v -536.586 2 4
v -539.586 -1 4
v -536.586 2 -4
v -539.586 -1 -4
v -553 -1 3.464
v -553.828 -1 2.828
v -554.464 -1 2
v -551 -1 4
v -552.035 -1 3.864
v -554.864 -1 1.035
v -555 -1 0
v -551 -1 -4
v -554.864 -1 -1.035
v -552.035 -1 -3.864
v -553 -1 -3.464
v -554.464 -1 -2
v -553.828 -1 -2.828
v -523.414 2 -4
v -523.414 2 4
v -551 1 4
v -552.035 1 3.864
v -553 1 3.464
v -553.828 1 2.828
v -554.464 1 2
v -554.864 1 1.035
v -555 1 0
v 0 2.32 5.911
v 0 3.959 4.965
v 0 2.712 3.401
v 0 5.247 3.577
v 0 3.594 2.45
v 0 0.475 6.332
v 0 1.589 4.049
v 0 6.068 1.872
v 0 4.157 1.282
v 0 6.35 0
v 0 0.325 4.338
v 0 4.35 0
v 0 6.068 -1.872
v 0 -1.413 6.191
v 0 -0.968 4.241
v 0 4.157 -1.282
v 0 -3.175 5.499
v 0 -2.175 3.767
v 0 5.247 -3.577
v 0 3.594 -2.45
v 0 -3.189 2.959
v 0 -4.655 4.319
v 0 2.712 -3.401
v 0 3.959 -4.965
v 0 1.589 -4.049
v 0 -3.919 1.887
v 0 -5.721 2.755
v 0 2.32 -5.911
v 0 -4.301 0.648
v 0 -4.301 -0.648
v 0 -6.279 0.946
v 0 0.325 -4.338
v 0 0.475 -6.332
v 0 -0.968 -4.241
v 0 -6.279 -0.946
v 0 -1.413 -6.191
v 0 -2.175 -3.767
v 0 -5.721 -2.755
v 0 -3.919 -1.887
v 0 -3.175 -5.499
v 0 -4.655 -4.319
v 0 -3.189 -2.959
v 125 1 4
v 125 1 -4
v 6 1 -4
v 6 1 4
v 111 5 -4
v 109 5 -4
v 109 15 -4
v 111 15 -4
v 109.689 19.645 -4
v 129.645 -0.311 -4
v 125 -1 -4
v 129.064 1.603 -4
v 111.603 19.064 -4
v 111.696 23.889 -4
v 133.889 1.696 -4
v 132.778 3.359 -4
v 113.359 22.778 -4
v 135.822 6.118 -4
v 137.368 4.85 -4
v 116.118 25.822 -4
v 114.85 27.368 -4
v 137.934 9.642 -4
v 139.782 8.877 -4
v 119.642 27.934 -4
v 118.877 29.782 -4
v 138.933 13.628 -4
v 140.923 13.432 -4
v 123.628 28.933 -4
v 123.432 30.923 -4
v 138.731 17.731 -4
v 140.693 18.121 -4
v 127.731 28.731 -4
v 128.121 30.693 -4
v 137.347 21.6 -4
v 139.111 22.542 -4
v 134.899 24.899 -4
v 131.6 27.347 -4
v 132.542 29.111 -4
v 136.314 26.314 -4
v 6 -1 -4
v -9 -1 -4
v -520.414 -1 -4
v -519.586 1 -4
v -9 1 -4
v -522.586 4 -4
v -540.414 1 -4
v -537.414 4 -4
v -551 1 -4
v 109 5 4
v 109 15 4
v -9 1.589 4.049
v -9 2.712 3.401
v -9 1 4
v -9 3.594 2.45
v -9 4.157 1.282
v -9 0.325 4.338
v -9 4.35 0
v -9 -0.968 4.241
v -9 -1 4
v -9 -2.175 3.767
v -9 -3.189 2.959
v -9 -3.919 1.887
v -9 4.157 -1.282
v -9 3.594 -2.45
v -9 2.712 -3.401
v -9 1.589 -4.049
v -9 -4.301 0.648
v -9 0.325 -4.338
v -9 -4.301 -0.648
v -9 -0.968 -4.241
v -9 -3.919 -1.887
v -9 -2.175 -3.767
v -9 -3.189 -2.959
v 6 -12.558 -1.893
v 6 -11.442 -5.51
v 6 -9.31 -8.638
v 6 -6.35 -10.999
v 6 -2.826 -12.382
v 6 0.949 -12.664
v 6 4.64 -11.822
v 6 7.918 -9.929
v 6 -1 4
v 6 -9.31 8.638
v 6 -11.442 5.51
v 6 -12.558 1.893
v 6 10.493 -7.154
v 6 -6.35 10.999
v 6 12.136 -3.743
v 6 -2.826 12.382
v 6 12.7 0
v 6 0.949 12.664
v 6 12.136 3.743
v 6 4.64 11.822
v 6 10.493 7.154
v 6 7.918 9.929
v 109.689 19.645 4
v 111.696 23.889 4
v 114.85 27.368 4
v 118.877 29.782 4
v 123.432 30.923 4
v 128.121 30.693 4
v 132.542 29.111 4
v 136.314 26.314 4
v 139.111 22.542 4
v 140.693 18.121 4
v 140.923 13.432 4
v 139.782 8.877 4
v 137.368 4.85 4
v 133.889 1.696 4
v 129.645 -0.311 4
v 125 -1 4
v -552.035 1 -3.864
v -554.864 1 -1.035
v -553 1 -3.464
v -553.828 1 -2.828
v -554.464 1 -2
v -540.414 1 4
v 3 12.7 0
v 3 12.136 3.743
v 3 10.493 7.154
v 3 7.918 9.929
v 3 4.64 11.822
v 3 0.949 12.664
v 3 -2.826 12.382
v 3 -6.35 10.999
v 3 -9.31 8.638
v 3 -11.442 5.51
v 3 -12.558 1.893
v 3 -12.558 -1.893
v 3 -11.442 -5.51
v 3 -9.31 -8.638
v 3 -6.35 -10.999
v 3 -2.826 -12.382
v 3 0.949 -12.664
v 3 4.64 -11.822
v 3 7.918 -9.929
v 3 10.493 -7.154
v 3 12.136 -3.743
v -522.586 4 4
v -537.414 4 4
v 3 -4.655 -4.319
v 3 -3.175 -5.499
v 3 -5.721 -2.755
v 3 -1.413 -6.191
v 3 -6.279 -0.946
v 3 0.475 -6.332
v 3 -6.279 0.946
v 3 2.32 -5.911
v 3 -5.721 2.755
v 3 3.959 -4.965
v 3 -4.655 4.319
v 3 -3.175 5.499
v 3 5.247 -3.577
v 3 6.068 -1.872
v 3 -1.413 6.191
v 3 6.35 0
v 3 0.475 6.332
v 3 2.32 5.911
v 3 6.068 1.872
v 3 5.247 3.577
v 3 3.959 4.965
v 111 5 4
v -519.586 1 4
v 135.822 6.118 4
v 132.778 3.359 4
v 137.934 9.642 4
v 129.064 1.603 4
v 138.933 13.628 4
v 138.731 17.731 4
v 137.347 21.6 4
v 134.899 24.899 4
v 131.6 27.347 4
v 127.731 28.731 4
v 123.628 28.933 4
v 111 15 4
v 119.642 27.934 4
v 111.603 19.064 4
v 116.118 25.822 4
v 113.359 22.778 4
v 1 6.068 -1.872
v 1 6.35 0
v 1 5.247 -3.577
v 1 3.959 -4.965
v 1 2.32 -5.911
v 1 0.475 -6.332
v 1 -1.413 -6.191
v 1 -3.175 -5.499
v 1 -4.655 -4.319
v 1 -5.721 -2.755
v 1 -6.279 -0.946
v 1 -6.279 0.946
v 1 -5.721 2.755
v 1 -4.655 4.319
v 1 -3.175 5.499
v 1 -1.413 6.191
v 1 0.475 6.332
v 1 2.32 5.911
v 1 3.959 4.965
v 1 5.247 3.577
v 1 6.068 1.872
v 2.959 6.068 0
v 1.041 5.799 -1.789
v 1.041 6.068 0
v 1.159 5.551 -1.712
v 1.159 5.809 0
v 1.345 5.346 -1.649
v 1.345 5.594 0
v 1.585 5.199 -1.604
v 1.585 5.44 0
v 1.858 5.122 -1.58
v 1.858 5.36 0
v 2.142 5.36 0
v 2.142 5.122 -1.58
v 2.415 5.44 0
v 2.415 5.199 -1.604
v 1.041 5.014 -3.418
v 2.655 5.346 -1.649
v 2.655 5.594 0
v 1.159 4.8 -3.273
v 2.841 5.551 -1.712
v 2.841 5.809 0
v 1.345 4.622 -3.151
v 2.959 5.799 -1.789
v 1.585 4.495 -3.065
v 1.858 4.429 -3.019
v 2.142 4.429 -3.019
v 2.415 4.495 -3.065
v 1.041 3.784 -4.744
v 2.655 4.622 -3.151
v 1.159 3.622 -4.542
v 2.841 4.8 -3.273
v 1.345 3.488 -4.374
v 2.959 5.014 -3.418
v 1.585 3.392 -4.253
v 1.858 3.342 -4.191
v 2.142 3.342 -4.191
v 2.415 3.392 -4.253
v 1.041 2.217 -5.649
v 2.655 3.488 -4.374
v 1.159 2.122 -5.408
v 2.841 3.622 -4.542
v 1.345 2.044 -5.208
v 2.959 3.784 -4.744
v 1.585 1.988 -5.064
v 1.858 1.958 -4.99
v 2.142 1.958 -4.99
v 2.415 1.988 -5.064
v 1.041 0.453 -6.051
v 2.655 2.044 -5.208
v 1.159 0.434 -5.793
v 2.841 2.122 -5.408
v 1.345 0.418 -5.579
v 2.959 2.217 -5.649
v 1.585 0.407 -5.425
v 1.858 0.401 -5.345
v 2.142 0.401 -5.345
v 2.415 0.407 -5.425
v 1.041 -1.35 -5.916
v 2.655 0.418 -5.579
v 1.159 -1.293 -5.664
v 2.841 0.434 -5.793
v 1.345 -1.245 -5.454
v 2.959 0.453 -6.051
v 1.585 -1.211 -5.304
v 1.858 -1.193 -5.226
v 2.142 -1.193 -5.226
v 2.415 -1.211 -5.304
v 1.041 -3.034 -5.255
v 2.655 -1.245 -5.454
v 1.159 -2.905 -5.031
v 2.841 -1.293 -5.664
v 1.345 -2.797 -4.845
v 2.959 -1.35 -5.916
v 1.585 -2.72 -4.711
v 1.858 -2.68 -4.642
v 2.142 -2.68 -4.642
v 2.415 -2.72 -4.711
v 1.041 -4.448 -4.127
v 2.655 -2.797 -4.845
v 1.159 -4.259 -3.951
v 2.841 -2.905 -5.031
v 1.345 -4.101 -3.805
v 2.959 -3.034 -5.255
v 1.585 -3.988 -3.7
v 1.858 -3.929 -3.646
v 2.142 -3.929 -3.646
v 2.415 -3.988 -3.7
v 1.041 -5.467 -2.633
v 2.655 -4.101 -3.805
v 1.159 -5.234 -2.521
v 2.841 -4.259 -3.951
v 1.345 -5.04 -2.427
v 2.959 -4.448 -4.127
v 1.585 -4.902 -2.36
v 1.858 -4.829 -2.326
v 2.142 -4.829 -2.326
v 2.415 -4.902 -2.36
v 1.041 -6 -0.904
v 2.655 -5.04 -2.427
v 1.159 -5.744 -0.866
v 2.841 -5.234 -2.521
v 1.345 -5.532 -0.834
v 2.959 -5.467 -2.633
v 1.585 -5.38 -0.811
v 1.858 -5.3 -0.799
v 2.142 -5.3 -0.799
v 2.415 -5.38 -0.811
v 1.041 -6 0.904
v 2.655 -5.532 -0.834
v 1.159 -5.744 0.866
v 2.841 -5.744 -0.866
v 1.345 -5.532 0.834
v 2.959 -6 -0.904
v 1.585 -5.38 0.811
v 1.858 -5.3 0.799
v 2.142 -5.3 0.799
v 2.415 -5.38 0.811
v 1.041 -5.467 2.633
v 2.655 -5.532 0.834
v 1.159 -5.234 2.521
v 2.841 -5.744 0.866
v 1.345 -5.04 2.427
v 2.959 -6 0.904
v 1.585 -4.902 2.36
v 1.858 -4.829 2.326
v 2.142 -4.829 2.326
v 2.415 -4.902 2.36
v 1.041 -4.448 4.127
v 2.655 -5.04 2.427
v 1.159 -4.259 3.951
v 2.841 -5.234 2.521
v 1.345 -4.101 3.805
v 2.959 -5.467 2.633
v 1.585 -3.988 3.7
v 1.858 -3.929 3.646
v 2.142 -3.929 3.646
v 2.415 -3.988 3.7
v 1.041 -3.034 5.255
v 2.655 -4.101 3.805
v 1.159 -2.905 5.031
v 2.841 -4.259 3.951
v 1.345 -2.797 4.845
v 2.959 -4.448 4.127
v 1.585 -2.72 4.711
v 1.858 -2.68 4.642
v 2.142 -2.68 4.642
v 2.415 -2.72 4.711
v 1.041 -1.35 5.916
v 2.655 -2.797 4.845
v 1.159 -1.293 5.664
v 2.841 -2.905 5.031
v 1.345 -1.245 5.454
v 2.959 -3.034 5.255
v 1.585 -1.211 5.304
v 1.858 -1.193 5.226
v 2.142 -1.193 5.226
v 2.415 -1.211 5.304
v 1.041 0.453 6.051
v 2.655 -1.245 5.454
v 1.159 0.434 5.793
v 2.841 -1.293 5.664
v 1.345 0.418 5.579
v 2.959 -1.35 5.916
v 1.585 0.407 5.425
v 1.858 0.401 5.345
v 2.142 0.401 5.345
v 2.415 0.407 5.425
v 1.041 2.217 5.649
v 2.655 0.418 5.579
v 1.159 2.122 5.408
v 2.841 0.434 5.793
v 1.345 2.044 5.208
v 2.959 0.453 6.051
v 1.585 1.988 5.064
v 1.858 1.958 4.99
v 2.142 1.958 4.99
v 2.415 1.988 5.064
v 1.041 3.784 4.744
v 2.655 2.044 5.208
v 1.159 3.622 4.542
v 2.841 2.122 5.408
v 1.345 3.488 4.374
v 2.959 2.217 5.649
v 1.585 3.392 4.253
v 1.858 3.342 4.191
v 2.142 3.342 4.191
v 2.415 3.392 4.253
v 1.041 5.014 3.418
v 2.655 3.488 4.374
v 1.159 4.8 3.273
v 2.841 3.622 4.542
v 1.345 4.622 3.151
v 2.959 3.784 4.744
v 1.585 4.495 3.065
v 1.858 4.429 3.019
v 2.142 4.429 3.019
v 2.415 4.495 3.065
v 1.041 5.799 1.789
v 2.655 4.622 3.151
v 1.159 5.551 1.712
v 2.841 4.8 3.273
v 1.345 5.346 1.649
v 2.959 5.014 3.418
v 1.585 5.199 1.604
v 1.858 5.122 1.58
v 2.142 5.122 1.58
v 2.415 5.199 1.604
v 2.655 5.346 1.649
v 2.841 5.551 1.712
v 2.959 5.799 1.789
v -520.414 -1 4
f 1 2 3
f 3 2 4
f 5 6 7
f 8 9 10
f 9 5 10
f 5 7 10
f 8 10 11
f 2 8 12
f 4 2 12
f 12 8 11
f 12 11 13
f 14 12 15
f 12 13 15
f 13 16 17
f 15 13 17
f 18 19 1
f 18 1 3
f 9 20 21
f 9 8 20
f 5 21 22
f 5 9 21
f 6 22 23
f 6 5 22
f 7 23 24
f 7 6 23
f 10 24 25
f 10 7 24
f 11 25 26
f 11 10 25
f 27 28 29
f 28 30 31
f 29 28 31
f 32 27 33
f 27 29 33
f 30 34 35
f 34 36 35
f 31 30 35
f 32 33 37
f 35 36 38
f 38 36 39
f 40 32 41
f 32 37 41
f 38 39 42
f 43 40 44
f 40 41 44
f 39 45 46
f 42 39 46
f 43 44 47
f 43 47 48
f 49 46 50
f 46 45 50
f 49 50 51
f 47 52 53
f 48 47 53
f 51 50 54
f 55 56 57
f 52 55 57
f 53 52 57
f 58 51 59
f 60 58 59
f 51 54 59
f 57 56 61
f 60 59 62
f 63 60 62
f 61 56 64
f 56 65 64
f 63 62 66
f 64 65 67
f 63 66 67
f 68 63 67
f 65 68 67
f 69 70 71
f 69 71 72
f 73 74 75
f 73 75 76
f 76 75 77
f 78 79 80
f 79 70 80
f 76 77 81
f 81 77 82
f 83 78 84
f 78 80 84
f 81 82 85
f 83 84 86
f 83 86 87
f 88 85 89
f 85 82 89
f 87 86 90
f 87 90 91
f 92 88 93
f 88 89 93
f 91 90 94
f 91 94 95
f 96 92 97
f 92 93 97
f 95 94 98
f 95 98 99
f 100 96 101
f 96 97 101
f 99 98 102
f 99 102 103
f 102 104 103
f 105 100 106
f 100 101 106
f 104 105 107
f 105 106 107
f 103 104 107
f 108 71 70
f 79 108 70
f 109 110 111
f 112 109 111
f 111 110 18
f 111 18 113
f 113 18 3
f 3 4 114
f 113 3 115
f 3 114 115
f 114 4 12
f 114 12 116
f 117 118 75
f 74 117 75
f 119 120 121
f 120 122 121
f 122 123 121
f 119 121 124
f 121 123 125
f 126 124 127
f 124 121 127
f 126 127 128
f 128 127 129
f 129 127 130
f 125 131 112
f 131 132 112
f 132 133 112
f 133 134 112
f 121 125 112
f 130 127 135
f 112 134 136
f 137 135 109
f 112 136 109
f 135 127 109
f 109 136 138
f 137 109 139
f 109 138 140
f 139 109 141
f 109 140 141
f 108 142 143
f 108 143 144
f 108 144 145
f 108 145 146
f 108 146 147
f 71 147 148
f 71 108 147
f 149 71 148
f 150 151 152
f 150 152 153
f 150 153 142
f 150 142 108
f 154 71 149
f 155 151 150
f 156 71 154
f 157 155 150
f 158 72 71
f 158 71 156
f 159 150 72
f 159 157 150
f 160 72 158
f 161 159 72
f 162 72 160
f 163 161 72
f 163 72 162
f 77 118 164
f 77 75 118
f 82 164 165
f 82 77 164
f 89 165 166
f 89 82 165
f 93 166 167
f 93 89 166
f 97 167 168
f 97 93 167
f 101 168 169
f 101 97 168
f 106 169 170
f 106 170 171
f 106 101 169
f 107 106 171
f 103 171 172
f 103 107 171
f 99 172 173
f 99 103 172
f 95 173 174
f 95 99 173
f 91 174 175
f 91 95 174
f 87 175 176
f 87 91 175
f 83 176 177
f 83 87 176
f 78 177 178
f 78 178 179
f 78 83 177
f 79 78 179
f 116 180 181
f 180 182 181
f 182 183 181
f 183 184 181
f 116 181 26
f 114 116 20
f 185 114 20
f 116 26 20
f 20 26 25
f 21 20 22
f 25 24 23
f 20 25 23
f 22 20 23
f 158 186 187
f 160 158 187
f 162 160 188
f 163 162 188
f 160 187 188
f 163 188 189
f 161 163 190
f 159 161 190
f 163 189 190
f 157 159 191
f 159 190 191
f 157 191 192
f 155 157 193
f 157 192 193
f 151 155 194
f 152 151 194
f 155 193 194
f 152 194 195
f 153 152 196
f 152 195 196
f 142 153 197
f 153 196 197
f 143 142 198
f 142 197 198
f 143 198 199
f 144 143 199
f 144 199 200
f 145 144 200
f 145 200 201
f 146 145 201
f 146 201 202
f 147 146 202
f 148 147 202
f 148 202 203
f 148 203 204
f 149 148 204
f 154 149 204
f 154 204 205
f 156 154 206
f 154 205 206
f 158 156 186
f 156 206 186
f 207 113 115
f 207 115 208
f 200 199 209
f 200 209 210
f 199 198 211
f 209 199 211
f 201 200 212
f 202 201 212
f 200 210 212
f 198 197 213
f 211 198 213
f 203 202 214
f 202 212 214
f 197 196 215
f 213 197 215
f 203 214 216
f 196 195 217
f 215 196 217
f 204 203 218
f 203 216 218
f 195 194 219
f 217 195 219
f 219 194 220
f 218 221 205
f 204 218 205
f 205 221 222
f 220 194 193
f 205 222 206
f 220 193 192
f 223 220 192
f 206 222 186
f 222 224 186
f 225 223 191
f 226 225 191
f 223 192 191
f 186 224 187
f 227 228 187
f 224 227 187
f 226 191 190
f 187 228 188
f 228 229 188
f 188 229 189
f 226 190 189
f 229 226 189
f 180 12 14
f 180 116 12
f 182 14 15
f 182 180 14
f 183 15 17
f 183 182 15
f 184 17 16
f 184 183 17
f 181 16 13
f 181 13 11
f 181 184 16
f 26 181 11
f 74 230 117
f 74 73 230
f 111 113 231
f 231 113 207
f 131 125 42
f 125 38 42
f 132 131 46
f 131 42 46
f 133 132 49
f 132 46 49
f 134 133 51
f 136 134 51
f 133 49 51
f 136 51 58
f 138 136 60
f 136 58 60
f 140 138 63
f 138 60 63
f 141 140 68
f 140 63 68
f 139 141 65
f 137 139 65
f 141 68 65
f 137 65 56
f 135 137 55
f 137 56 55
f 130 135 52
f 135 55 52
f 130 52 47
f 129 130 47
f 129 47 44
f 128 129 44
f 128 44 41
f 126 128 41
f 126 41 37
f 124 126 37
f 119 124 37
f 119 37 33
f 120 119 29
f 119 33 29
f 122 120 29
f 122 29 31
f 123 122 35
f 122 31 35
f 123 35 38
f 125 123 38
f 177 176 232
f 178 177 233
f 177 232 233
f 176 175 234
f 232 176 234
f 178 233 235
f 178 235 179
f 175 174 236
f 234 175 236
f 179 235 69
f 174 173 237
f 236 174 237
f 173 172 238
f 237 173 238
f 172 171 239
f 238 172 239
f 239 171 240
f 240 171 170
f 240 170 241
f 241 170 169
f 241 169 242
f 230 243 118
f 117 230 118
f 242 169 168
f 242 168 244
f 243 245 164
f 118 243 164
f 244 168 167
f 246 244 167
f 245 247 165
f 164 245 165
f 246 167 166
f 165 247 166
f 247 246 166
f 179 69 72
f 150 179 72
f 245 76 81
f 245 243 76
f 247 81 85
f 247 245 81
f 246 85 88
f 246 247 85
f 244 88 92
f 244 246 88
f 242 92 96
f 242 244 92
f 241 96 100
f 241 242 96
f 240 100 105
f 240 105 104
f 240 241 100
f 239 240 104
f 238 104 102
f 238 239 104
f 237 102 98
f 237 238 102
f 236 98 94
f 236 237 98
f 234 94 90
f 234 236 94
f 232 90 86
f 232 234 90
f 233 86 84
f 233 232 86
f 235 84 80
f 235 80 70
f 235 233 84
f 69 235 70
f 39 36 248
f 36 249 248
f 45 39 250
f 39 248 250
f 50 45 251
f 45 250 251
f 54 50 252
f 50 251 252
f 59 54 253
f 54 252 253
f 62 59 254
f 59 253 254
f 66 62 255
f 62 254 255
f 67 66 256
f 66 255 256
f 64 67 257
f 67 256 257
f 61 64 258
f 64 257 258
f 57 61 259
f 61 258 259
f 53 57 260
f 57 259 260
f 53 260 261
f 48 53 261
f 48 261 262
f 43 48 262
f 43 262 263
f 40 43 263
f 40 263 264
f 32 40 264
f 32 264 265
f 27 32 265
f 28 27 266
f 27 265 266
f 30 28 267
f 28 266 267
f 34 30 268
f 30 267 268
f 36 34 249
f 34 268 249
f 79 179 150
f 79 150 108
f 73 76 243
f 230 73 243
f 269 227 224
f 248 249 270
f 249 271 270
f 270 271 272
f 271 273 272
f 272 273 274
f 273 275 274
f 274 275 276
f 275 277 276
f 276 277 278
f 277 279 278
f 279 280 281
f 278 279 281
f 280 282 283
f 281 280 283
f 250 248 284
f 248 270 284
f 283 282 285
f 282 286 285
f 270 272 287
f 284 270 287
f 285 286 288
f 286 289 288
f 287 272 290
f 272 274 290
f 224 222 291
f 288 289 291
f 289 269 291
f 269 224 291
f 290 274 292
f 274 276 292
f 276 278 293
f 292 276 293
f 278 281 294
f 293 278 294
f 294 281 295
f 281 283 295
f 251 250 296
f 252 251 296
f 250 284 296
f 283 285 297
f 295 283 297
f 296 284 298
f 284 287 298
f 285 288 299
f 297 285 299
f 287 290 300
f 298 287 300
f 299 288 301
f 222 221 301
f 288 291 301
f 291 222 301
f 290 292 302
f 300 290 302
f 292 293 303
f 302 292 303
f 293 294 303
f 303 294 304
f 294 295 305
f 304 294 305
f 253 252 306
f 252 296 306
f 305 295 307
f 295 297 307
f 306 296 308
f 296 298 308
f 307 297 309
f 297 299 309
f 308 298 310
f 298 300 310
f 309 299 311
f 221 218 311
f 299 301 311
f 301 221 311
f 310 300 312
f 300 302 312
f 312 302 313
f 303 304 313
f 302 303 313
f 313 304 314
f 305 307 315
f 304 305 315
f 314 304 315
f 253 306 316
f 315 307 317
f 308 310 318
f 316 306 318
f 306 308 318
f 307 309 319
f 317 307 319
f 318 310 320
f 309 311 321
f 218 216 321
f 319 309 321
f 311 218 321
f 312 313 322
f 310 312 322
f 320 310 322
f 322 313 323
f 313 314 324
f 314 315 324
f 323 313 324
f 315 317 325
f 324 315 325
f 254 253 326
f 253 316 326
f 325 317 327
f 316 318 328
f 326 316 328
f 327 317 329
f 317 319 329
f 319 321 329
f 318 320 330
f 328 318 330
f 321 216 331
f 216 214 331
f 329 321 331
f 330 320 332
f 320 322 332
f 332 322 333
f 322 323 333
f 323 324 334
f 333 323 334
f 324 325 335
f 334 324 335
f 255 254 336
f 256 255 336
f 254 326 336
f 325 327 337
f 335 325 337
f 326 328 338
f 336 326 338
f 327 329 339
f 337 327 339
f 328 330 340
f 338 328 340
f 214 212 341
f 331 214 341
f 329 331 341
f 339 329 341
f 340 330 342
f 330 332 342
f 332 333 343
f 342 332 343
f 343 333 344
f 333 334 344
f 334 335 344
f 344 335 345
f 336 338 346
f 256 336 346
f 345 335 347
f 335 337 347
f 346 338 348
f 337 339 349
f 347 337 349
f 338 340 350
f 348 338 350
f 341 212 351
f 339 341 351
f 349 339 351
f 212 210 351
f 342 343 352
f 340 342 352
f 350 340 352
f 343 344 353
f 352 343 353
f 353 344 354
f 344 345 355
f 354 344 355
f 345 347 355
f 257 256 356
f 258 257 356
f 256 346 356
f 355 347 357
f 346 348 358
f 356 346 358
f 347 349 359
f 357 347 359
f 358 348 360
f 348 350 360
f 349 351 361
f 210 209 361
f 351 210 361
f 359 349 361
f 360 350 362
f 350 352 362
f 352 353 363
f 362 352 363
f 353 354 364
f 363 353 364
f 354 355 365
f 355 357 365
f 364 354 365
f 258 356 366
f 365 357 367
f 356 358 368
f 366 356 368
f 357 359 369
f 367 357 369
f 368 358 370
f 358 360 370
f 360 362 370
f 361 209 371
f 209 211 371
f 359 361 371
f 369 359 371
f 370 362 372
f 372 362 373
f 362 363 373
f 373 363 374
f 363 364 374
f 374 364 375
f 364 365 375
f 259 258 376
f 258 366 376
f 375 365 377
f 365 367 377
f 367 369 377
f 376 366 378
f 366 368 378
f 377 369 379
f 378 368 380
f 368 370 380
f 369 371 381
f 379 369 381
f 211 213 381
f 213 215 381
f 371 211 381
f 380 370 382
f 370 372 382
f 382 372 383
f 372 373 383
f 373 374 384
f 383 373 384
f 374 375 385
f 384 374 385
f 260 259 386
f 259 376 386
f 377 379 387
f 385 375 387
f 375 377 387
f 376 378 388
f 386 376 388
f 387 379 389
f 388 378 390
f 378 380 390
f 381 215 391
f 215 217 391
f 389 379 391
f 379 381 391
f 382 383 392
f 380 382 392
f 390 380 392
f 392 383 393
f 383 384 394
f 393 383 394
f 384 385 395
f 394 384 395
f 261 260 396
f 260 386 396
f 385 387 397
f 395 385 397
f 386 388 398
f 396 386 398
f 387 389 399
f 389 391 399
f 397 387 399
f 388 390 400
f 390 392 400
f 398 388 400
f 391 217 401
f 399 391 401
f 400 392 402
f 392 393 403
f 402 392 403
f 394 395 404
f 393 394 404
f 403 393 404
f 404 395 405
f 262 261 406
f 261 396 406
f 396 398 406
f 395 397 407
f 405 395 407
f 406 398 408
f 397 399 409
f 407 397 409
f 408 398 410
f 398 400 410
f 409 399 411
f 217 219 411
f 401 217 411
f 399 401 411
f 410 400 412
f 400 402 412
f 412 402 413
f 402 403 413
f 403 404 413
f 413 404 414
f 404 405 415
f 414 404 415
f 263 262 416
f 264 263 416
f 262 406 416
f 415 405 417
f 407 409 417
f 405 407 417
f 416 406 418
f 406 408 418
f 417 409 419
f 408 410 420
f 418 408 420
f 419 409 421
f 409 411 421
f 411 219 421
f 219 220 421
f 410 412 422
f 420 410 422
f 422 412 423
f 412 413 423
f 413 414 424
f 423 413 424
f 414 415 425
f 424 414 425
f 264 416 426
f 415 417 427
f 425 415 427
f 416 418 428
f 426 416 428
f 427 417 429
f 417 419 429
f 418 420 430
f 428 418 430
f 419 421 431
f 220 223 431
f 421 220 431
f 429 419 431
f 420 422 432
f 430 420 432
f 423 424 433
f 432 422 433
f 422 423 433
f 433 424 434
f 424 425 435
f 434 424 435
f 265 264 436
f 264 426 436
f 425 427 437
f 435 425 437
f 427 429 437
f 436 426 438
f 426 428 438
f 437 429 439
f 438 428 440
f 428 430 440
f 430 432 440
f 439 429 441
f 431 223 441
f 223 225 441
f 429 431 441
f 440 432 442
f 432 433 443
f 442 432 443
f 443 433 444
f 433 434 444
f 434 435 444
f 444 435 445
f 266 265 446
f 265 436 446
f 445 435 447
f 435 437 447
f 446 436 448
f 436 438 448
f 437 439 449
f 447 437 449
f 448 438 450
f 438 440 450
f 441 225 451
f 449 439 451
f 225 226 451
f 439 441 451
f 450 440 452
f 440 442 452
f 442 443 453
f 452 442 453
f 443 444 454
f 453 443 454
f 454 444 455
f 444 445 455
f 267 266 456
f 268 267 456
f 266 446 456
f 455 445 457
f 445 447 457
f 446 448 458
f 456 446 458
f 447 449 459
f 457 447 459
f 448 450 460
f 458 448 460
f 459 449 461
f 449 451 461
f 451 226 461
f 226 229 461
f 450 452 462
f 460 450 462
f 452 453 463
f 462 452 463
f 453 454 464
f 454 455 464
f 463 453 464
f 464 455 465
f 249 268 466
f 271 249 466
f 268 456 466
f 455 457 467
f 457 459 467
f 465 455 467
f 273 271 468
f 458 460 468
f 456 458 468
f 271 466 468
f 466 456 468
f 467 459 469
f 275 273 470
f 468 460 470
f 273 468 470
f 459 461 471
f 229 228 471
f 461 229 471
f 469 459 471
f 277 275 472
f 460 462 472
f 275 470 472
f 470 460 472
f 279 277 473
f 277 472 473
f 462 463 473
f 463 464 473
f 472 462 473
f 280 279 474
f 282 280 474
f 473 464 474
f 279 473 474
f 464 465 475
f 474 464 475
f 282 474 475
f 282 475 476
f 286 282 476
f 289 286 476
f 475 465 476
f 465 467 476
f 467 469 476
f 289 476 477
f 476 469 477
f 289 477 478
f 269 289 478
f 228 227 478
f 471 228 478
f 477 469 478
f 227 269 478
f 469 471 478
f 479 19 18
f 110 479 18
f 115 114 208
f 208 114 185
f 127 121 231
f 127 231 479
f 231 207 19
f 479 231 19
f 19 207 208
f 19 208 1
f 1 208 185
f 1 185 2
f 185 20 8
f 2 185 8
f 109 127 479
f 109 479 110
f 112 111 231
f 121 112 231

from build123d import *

# Parameters (mm, degrees)
SZKIC6_R                    = 12.7
DODANIE_WYCI_GNI_CIE3_DEPTH = 3
SZKIC7_W                    = 8
SZKIC7_H                    = 2
ZAOKR_GLENIE3_R             = 4


with BuildPart() as part:
    # Szkic5 → Obrót1 (revolve)
    with BuildSketch(Plane.XY):
        with BuildLine():
            Line((0, 6.35), (1, 6.35))
            ThreePointArc((1, 6.35), (2, 5.35), (3, 6.35))
            Line((3, 6.35), (3, 0))
            Line((3, 0), (0, 0))
            Line((0, 0), (-9, 0))
            Line((-9, 0), (-9, 4.35))
            Line((-9, 4.35), (0, 4.35))
            Line((0, 4.35), (0, 6.35))
        make_face()
    revolve(axis=Axis((0, 0, 0), (-1, 0, 0)))

    # Szkic6 → Dodanie-wyciągnięcie3 (add)
    with BuildSketch(Plane(origin=(3, 0, 0), x_dir=(0, 0, -1), z_dir=(1, 0, 0))):
        with Locations(Location((0, 0, 0), (0, 0, 90))):
            Circle(SZKIC6_R)
    extrude(amount=DODANIE_WYCI_GNI_CIE3_DEPTH)

    # Wyciągnięcie po ścieżce1: sweep along a path in Szkic1
    with BuildLine(Plane.XY) as wyci_gni_cie_po_cie_ce1_path:
        Line((110, 5), (110, 15))
        ThreePointArc((110, 15), (135.606601718, 25.606601718), (125, 0))
        Line((125, 0), (0, 0))
        Line((0, 0), (-520, 0))
        Line((-520, 0), (-523, 3))
        Line((-523, 3), (-537, 3))
        Line((-537, 3), (-540, 0))
        Line((-540, 0), (-555, 0))
    # Szkic7 → Wyciągnięcie po ścieżce1 (sweep)
    with BuildSketch(Plane(origin=(0, 0, 0), x_dir=(0, 0, -1), z_dir=(1, 0, 0))):
        Rectangle(SZKIC7_W, SZKIC7_H)
    sweep(path=wyci_gni_cie_po_cie_ce1_path.line, transition=Transition.RIGHT)

    # Zaokrąglenie3
    zaokr_glenie3_edges = [part.edges().sort_by_distance(p)[0] for p in [
        (-555, 0, -4),
        (-555, 0, 4),
    ]]
    fillet(zaokr_glenie3_edges, radius=ZAOKR_GLENIE3_R - 0.0001)  # a hair under: the kernel refuses the full size


solid = part.part
